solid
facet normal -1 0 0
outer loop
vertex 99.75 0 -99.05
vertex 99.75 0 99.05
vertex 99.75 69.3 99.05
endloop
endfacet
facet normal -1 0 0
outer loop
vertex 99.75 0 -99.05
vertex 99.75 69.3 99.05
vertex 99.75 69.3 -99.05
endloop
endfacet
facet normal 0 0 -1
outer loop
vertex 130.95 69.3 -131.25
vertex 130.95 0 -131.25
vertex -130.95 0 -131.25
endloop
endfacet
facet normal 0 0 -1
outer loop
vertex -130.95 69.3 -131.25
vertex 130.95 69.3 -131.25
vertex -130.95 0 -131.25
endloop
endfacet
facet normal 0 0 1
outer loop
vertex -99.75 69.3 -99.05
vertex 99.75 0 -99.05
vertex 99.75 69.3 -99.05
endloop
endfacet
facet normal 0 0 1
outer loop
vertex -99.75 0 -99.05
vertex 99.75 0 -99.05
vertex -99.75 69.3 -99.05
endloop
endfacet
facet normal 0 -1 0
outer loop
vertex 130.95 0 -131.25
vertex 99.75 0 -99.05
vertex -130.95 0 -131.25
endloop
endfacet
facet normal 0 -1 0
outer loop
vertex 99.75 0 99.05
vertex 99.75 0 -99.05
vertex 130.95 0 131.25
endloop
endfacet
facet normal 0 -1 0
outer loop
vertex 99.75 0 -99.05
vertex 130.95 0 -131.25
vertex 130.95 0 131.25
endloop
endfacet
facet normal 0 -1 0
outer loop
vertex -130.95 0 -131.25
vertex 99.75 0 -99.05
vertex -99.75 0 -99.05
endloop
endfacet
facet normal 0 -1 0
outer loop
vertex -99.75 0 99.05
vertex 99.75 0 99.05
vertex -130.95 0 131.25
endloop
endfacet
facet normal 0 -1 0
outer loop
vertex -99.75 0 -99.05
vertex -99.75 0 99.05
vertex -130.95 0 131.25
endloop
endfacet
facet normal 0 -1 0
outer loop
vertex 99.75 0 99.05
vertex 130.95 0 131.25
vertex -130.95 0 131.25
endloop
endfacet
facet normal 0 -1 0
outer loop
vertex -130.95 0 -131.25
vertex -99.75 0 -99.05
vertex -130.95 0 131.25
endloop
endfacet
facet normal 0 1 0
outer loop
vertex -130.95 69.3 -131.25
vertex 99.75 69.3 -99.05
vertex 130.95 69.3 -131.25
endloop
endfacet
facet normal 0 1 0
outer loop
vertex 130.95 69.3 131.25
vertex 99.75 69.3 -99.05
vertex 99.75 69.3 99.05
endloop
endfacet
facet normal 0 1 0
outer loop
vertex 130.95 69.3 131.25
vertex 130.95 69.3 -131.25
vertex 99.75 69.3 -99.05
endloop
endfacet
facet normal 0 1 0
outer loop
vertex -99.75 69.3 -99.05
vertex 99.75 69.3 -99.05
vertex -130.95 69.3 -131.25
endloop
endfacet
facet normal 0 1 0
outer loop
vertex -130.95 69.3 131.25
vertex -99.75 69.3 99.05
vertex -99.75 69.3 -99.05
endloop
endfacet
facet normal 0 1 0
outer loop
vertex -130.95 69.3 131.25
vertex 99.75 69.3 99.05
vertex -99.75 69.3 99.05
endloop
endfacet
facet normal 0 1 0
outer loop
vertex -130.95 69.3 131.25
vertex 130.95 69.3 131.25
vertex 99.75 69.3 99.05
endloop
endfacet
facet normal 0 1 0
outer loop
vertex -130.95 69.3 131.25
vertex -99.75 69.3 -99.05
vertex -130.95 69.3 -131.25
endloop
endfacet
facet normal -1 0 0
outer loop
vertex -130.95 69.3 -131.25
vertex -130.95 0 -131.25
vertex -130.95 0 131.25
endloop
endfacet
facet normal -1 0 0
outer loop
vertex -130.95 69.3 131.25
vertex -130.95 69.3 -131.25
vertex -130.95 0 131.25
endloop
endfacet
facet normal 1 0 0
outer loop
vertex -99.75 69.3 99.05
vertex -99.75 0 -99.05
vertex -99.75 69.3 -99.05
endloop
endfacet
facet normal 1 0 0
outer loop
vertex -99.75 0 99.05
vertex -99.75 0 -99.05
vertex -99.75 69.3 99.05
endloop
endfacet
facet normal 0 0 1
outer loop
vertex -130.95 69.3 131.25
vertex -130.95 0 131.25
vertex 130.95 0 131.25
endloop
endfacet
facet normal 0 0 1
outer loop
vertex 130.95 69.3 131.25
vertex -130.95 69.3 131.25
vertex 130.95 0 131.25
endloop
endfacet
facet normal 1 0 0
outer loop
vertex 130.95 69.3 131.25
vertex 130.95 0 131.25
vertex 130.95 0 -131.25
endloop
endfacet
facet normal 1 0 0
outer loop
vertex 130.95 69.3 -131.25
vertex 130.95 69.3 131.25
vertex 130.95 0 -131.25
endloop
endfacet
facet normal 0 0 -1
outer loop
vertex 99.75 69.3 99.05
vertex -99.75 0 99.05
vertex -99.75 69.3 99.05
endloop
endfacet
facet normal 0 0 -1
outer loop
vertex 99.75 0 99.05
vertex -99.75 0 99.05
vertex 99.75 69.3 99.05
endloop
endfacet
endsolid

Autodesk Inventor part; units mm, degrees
ref_plane "YZ Plane" through (0, 0, 0) normal (1, 0, 0) x (0, 1, 0)
ref_plane "XZ Plane" through (0, 0, 0) normal (0, 1, 0) x (-1, 0, 0)
ref_plane "XY Plane" through (0, 0, 0) normal (0, 0, 1) x (1, 0, 0)
sketch "Esboço1" plane through (0, 0, 0) normal (0, 1, 0) x (-1, 0, 0)
  line L0 (130.95, 131.25) -> (-130.95, 131.25)
  line L1 (-130.95, 131.25) -> (-130.95, -131.25)
  line L2 (-130.95, -131.25) -> (130.95, -131.25)
  line L3 (130.95, -131.25) -> (130.95, 131.25)
  line L4 (130.95, 131.25) -> (-130.95, -131.25) construction
  line L5 (-130.95, 131.25) -> (130.95, -131.25) construction
  line L6 (130.95, 99.05) -> (-130.95, 99.05)
  line L7 (-130.95, -99.05) -> (130.95, -99.05)
  line L8 (-99.75, 131.25) -> (-99.75, -131.25)
  line L9 (99.75, -131.25) -> (99.75, 131.25)
  point P0 (0, 0)
  point P1 (99.75, -99.05)
  point P2 (99.75, 99.05)
  point P3 (-99.75, 99.05)
  point P4 (-99.75, -99.05)
  dimension "d0" = 261.9
  dimension "d1" = 262.5
  dimension "d2" = 32.2
  dimension "d3" = 32.2
  dimension "d4" = 31.2
  dimension "d5" = 31.2
extrude "Extrusão1" add sketch "Esboço1" along normal blind 69.3
extrude "Extrusão2" cut sketch "Esboço1" along normal blind 69.3 contours L9 L7 L8 L6
properties part number "NinhoColmeia"
